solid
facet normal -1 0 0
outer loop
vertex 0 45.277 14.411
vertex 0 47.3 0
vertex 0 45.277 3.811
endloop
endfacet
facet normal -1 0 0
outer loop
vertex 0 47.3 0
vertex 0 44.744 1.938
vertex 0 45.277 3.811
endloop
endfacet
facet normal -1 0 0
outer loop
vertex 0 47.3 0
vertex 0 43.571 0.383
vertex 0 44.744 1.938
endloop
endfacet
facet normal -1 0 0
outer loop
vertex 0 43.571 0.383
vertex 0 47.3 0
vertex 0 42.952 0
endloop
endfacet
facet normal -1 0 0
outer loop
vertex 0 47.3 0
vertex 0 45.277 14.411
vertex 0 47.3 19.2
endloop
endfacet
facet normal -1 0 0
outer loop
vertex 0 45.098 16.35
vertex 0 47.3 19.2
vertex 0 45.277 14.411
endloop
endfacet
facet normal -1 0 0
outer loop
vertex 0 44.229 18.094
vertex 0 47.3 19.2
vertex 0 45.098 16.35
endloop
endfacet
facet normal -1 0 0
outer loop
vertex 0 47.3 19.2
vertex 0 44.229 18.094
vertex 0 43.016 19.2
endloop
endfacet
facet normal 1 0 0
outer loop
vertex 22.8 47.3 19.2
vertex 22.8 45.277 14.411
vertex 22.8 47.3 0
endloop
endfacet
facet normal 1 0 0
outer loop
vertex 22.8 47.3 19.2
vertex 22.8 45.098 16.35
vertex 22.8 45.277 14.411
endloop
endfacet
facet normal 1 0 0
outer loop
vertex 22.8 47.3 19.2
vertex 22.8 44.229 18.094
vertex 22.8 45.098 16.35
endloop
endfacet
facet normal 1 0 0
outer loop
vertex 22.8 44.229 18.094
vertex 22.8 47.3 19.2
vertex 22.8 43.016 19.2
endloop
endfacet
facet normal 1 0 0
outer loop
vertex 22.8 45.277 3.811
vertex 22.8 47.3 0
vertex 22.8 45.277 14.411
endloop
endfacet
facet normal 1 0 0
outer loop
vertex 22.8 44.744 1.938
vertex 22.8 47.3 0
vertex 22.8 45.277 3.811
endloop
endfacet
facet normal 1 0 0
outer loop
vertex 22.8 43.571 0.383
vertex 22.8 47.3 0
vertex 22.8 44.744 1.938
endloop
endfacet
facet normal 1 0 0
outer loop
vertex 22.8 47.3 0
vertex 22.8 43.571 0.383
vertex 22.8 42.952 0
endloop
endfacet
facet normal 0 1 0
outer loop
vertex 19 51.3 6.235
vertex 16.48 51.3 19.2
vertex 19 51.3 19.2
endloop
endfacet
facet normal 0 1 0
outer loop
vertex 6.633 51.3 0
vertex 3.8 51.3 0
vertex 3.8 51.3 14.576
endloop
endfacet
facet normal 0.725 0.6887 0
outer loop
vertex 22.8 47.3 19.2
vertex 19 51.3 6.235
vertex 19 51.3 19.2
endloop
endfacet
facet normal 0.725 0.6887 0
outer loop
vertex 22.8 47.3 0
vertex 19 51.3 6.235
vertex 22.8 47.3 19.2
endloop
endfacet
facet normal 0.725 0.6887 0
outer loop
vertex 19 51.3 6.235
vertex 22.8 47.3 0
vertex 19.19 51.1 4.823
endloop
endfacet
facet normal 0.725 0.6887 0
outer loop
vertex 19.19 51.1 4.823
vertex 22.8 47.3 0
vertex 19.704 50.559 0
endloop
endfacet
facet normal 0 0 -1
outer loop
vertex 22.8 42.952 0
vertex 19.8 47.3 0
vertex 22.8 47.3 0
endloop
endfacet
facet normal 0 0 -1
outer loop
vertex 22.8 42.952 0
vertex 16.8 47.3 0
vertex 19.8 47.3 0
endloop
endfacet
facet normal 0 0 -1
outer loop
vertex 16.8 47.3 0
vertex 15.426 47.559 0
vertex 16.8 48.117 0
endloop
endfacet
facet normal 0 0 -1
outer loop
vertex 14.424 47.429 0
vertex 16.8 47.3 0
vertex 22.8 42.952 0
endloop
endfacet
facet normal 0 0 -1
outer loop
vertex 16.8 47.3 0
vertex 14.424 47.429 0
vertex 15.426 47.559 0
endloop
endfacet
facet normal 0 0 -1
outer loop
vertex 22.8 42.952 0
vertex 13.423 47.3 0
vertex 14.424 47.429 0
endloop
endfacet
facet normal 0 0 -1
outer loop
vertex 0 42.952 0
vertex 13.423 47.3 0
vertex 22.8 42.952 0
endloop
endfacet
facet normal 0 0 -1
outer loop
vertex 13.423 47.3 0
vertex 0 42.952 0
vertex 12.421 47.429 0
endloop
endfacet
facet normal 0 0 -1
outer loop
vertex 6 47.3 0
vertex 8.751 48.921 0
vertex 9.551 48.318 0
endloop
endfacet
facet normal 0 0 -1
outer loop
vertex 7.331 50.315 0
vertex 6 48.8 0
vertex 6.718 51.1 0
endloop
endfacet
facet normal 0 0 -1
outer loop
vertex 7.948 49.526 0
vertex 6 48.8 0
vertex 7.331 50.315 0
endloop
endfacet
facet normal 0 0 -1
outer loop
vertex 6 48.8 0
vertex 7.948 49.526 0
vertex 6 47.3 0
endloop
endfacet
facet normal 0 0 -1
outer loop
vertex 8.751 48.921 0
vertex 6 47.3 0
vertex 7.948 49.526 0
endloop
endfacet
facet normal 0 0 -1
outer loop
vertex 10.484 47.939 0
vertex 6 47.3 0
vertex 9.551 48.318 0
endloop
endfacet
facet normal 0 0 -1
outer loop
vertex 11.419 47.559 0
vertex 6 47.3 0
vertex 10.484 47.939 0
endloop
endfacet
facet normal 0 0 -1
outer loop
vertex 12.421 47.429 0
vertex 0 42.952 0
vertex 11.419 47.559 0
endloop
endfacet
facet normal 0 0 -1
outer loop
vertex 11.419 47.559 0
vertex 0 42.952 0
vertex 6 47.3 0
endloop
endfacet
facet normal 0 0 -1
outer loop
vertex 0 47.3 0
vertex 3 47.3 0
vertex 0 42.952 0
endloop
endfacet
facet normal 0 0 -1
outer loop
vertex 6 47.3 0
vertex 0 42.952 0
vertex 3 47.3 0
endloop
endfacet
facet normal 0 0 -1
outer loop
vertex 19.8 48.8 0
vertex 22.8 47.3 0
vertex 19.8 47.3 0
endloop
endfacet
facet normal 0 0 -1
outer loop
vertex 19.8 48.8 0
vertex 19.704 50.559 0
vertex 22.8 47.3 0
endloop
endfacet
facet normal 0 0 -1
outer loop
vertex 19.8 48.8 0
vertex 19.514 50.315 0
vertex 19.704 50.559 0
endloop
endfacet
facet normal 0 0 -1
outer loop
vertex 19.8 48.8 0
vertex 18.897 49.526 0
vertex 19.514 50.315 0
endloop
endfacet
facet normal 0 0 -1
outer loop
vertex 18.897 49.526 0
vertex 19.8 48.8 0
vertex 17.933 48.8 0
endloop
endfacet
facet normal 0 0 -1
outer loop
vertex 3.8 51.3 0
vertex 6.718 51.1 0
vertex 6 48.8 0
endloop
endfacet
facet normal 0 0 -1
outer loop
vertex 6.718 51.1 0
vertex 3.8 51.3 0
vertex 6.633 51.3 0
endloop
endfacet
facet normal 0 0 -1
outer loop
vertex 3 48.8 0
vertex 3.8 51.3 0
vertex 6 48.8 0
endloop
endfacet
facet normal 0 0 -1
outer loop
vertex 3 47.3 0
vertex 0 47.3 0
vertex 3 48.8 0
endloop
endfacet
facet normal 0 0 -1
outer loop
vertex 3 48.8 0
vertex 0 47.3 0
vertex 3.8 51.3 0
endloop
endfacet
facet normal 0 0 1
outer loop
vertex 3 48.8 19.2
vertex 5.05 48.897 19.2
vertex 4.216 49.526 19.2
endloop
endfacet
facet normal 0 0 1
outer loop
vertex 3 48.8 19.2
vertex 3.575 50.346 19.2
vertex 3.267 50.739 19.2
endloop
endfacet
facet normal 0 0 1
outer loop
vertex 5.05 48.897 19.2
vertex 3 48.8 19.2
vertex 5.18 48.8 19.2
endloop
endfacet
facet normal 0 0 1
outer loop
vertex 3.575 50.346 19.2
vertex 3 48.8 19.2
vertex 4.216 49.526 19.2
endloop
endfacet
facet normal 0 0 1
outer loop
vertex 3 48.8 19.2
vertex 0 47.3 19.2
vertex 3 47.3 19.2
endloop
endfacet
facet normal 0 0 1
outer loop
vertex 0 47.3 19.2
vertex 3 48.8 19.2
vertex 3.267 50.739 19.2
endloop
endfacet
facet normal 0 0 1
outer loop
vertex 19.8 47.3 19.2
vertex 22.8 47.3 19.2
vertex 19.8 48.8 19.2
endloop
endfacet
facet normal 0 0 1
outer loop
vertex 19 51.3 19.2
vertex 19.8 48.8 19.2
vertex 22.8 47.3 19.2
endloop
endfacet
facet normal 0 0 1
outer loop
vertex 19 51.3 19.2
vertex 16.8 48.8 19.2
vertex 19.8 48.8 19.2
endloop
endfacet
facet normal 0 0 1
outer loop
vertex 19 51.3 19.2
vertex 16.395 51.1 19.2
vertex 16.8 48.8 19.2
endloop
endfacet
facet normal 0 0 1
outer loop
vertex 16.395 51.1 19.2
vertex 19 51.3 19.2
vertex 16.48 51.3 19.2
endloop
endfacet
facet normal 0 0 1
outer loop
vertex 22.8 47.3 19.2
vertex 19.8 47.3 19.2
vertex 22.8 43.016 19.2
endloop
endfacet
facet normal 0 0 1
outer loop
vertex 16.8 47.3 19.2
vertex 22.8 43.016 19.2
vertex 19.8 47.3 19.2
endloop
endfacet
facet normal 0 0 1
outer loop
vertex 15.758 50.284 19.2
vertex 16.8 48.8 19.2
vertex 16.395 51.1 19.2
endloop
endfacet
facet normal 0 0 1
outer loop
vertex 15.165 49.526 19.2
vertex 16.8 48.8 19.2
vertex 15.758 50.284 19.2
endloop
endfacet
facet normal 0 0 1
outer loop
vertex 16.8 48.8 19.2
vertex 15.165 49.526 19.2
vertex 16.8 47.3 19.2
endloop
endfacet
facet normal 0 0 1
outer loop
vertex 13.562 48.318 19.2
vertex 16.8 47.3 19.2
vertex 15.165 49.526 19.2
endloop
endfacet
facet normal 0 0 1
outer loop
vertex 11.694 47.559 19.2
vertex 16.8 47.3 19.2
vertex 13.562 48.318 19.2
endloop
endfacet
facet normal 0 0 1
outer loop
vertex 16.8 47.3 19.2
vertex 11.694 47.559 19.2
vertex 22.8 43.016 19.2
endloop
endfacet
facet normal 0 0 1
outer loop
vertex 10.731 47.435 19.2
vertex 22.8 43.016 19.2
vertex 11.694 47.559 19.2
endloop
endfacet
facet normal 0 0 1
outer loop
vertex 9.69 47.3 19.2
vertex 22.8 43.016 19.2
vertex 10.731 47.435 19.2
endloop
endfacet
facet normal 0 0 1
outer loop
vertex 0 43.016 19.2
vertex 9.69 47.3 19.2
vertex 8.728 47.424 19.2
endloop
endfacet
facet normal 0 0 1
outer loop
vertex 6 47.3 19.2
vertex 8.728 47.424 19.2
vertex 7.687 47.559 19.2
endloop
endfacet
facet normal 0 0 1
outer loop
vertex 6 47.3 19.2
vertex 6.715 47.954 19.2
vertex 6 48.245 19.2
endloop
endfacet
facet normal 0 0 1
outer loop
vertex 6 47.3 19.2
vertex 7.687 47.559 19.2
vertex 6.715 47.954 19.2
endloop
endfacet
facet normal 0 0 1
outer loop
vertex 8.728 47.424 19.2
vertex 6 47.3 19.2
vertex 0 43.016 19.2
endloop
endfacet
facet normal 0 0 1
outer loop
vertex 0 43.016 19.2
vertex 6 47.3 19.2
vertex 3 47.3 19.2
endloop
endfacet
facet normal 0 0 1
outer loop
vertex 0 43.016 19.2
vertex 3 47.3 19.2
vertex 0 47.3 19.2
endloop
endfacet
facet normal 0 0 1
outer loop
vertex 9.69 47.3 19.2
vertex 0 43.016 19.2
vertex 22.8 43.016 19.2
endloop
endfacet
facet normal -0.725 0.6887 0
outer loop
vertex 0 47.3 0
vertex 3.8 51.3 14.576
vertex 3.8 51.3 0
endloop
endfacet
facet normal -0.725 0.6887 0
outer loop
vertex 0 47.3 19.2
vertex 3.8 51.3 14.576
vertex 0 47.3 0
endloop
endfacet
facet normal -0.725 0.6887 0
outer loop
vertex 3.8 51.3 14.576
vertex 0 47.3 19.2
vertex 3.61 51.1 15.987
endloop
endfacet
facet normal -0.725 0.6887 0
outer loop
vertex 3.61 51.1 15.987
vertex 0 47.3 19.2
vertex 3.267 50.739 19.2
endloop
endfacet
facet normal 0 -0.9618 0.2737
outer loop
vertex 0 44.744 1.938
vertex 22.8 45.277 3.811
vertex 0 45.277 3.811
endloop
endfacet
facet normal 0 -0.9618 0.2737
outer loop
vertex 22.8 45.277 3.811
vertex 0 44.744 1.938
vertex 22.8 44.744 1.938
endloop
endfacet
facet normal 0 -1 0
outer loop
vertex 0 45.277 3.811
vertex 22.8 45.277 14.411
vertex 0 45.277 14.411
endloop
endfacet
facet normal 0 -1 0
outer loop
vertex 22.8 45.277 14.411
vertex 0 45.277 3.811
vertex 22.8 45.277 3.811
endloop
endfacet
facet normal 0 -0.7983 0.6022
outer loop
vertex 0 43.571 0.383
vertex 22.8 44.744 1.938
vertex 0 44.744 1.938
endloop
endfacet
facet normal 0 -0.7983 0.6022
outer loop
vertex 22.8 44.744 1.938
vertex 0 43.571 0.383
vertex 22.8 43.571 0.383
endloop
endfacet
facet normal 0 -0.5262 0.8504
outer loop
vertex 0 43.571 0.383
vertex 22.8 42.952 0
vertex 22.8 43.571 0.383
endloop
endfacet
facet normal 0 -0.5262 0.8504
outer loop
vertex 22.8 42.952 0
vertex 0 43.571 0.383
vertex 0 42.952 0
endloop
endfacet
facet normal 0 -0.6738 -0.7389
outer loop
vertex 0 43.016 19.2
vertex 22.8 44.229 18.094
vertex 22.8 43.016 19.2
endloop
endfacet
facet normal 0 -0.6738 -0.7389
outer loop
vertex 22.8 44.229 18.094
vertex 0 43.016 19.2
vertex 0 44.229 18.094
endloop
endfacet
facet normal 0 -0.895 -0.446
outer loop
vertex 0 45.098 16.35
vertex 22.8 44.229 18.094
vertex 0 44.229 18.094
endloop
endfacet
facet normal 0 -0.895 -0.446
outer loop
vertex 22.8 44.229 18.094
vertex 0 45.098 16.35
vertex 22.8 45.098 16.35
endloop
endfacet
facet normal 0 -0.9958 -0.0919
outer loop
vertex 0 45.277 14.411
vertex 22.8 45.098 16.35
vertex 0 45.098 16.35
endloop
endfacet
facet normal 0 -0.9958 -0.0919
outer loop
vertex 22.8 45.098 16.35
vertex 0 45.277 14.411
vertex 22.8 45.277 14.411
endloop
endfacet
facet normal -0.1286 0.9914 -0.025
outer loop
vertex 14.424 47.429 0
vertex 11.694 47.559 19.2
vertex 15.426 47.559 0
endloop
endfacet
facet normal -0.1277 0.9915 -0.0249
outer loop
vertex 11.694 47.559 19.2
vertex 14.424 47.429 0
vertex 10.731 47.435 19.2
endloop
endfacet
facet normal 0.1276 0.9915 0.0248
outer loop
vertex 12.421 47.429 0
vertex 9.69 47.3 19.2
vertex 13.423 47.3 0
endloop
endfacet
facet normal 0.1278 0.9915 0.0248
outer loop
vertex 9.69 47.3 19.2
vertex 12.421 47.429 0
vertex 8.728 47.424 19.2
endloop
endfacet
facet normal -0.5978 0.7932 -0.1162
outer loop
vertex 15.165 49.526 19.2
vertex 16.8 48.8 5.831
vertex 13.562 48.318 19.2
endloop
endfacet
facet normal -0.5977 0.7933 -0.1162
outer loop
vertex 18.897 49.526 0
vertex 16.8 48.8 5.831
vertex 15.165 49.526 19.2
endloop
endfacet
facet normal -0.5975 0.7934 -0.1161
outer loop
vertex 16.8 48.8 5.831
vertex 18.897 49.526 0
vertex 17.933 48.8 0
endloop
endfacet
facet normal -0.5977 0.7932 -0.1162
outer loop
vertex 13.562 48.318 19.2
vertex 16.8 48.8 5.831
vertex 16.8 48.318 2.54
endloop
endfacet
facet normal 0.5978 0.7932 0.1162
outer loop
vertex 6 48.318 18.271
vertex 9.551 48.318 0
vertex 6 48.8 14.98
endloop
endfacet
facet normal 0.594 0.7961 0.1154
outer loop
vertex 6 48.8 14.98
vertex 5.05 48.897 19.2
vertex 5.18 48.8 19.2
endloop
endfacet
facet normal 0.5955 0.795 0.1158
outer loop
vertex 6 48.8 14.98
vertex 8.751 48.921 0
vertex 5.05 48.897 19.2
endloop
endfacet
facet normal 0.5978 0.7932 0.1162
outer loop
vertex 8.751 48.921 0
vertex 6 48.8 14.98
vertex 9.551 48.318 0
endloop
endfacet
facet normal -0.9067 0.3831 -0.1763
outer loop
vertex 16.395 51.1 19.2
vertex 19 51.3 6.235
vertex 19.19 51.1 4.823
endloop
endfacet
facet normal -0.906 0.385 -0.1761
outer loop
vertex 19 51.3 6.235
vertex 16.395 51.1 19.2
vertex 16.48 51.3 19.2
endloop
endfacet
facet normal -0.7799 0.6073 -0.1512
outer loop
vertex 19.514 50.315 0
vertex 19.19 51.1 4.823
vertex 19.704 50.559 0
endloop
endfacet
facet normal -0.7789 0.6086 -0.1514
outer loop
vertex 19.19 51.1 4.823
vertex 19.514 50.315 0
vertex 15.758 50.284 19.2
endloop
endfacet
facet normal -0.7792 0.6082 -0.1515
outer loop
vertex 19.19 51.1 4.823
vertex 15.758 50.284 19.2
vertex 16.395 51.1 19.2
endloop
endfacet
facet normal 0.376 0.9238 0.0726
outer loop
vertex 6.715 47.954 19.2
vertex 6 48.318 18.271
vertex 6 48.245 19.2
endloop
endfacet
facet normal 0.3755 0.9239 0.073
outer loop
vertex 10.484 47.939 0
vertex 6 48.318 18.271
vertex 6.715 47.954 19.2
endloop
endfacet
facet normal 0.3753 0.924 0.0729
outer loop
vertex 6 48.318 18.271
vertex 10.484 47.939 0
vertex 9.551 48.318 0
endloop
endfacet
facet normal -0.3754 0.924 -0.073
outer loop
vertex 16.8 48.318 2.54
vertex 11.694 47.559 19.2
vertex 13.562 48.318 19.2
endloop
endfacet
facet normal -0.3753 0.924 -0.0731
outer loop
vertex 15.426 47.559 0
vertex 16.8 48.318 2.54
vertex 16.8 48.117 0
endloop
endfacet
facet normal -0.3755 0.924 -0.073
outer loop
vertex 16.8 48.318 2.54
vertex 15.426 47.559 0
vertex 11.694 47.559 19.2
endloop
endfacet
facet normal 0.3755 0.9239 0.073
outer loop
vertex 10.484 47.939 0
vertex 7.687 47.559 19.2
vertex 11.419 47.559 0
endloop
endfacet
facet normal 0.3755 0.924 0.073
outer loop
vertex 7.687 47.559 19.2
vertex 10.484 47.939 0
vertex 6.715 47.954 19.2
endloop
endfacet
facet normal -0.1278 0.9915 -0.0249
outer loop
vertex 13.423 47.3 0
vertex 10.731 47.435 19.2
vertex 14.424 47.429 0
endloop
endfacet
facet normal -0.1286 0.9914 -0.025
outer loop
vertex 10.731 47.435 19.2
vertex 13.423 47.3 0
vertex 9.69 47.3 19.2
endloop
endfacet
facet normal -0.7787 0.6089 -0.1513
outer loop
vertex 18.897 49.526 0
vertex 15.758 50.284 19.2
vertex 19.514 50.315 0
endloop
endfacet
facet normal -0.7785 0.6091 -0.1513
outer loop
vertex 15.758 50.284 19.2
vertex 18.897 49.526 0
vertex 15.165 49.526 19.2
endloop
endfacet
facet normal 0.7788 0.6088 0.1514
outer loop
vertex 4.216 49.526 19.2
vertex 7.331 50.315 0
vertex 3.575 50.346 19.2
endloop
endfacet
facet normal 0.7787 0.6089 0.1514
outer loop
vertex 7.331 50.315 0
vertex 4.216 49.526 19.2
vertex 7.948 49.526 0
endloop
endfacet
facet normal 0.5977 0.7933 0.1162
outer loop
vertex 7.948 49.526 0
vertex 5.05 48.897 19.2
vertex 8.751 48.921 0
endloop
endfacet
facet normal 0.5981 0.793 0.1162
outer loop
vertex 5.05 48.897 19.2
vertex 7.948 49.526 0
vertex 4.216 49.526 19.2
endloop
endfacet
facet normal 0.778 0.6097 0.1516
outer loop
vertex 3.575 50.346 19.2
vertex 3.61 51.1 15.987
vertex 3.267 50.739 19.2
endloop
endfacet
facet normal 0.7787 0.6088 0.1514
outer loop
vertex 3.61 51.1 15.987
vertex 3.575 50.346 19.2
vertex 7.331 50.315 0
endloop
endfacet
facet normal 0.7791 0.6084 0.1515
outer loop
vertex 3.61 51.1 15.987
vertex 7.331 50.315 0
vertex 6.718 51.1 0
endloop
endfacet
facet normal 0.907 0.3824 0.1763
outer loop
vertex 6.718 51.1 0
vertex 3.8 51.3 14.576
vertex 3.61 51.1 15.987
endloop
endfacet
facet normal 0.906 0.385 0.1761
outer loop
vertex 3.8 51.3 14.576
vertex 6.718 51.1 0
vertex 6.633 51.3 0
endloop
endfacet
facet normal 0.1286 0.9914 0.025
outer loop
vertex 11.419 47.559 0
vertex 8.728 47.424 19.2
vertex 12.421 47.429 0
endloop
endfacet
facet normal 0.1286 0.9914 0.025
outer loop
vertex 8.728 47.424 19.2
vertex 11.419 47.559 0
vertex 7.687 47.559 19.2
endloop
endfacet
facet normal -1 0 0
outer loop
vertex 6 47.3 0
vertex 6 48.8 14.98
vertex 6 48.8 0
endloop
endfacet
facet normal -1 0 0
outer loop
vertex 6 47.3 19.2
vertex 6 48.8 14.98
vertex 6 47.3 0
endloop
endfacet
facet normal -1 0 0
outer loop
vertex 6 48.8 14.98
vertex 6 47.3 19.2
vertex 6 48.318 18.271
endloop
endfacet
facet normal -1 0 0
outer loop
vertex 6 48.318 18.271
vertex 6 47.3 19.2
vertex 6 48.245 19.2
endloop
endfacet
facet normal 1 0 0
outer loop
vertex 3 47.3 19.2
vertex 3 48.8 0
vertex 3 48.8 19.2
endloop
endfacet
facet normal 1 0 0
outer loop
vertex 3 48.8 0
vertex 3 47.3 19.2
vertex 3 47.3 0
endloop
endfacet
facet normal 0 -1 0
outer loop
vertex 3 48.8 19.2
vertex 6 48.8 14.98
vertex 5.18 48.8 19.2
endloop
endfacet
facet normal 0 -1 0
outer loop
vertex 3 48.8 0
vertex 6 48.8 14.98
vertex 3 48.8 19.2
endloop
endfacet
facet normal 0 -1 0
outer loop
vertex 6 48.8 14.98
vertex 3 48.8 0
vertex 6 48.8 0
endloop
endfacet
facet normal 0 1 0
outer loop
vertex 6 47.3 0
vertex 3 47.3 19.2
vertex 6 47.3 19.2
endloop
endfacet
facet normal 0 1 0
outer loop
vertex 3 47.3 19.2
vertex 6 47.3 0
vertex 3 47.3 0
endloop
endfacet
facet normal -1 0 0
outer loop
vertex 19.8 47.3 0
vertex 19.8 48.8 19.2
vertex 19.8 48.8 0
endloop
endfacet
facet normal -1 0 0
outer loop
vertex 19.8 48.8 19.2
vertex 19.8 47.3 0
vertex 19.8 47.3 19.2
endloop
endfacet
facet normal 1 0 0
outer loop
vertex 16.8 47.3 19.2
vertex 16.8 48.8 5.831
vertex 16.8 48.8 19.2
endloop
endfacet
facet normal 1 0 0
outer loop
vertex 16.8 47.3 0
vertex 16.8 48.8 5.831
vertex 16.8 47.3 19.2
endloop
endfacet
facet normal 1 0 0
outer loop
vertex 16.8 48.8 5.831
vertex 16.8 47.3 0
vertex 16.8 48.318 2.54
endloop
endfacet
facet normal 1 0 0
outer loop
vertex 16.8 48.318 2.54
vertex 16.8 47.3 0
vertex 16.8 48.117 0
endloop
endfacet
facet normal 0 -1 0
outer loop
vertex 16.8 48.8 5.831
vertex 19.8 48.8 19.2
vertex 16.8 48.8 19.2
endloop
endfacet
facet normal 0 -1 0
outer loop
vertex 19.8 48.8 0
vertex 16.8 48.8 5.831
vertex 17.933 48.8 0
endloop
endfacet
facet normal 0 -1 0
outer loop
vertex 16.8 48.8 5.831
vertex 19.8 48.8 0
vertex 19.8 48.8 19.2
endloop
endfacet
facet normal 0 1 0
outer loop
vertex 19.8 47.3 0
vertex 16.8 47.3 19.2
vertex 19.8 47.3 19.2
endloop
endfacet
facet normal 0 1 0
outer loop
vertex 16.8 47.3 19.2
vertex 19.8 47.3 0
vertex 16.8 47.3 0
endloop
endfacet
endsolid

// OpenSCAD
use <../utilities.scad>;
d=0.05;
bar_r=10.6/2;
lock_r=14/2+0.6;
angle=-11;

module annulus(inner_r,thickness,h){
	difference(){
		cylinder(r=inner_r+thickness,h=h);
		cylinder(r=inner_r,h=99999,center=true);
	}
}
module cable_tie(inner_r){
	annulus(inner_r+2,2,5);
}

%rotate([0,-angle,0]) difference(){
	union(){
		translate([-3,2+bar_r,-3]) rotate([0,angle,0]) cube([33,bar_r+6+2*lock_r+1,9]);
	}
	
	//rack centre
	mirror([1,0,0]) translate([0,-999,0]) hull(){
		cube([999,999*2,d]);
		translate([5,0,9]) cube([999,999*2,d]);
	}

	//rack bar
	translate([26.5-0.2-0.5+bar_r,0,bar_r]) rotate([-90,0,0]){
		cylinder(r=bar_r,h=999*2,center=true);
		translate([0,0,2*bar_r+6+2*lock_r-4]) cable_tie(bar_r+0.5);
	}

	//cross bar
	translate([0,bar_r,-1]) rotate([0,90,0]) {
		cylinder(r=bar_r+0.5,h=999*2,center=true);
		translate([0,0,3]) cable_tie(bar_r+0.5);
		translate([0,0,18]) cable_tie(bar_r+0.5);
	}

	//lock
	translate([16,2*bar_r+6+lock_r,0]) rotate([0,angle,0]){
		cylinder(r=lock_r,h=999,center=true);
	}
}

translate([0,40,0]) difference(){
//	translate([0,4,0]) hull() repeat([bar_r*2,0,0],2) cylinder(r=bar_r+1,h=lock_r*3);
	hull(){
		cube([lock_r*3,bar_r+2,bar_r*4-2]);
		translate([lock_r*0.5,0,0]) cube([lock_r*2,bar_r+6,bar_r*4-2]);
//		translate([lock_r*1.5,bar_r+2+lock_r,0]) cylinder(r=lock_r+3,h=bar_r*4-2);
	}

	//indent for rack
	translate([0,0,bar_r-1]) hull() repeat([0,0,bar_r*2],2) rotate([0,90,0]) cylinder(r=bar_r,h=999,center=true);
	
	//indent for lock
	translate([lock_r*1.5-bar_r*2*sin(angle),bar_r+2+lock_r,0]) rotate([0,angle,0]){
		cylinder(r=lock_r,h=999,center=true);
	}
	//cable ties
	translate([4.5,bar_r+2.75,0]) cube([3,1.5,999],center=true);
	translate([lock_r*3-3-1.5,bar_r+2.75,0]) cube([3,1.5,999],center=true);
}
